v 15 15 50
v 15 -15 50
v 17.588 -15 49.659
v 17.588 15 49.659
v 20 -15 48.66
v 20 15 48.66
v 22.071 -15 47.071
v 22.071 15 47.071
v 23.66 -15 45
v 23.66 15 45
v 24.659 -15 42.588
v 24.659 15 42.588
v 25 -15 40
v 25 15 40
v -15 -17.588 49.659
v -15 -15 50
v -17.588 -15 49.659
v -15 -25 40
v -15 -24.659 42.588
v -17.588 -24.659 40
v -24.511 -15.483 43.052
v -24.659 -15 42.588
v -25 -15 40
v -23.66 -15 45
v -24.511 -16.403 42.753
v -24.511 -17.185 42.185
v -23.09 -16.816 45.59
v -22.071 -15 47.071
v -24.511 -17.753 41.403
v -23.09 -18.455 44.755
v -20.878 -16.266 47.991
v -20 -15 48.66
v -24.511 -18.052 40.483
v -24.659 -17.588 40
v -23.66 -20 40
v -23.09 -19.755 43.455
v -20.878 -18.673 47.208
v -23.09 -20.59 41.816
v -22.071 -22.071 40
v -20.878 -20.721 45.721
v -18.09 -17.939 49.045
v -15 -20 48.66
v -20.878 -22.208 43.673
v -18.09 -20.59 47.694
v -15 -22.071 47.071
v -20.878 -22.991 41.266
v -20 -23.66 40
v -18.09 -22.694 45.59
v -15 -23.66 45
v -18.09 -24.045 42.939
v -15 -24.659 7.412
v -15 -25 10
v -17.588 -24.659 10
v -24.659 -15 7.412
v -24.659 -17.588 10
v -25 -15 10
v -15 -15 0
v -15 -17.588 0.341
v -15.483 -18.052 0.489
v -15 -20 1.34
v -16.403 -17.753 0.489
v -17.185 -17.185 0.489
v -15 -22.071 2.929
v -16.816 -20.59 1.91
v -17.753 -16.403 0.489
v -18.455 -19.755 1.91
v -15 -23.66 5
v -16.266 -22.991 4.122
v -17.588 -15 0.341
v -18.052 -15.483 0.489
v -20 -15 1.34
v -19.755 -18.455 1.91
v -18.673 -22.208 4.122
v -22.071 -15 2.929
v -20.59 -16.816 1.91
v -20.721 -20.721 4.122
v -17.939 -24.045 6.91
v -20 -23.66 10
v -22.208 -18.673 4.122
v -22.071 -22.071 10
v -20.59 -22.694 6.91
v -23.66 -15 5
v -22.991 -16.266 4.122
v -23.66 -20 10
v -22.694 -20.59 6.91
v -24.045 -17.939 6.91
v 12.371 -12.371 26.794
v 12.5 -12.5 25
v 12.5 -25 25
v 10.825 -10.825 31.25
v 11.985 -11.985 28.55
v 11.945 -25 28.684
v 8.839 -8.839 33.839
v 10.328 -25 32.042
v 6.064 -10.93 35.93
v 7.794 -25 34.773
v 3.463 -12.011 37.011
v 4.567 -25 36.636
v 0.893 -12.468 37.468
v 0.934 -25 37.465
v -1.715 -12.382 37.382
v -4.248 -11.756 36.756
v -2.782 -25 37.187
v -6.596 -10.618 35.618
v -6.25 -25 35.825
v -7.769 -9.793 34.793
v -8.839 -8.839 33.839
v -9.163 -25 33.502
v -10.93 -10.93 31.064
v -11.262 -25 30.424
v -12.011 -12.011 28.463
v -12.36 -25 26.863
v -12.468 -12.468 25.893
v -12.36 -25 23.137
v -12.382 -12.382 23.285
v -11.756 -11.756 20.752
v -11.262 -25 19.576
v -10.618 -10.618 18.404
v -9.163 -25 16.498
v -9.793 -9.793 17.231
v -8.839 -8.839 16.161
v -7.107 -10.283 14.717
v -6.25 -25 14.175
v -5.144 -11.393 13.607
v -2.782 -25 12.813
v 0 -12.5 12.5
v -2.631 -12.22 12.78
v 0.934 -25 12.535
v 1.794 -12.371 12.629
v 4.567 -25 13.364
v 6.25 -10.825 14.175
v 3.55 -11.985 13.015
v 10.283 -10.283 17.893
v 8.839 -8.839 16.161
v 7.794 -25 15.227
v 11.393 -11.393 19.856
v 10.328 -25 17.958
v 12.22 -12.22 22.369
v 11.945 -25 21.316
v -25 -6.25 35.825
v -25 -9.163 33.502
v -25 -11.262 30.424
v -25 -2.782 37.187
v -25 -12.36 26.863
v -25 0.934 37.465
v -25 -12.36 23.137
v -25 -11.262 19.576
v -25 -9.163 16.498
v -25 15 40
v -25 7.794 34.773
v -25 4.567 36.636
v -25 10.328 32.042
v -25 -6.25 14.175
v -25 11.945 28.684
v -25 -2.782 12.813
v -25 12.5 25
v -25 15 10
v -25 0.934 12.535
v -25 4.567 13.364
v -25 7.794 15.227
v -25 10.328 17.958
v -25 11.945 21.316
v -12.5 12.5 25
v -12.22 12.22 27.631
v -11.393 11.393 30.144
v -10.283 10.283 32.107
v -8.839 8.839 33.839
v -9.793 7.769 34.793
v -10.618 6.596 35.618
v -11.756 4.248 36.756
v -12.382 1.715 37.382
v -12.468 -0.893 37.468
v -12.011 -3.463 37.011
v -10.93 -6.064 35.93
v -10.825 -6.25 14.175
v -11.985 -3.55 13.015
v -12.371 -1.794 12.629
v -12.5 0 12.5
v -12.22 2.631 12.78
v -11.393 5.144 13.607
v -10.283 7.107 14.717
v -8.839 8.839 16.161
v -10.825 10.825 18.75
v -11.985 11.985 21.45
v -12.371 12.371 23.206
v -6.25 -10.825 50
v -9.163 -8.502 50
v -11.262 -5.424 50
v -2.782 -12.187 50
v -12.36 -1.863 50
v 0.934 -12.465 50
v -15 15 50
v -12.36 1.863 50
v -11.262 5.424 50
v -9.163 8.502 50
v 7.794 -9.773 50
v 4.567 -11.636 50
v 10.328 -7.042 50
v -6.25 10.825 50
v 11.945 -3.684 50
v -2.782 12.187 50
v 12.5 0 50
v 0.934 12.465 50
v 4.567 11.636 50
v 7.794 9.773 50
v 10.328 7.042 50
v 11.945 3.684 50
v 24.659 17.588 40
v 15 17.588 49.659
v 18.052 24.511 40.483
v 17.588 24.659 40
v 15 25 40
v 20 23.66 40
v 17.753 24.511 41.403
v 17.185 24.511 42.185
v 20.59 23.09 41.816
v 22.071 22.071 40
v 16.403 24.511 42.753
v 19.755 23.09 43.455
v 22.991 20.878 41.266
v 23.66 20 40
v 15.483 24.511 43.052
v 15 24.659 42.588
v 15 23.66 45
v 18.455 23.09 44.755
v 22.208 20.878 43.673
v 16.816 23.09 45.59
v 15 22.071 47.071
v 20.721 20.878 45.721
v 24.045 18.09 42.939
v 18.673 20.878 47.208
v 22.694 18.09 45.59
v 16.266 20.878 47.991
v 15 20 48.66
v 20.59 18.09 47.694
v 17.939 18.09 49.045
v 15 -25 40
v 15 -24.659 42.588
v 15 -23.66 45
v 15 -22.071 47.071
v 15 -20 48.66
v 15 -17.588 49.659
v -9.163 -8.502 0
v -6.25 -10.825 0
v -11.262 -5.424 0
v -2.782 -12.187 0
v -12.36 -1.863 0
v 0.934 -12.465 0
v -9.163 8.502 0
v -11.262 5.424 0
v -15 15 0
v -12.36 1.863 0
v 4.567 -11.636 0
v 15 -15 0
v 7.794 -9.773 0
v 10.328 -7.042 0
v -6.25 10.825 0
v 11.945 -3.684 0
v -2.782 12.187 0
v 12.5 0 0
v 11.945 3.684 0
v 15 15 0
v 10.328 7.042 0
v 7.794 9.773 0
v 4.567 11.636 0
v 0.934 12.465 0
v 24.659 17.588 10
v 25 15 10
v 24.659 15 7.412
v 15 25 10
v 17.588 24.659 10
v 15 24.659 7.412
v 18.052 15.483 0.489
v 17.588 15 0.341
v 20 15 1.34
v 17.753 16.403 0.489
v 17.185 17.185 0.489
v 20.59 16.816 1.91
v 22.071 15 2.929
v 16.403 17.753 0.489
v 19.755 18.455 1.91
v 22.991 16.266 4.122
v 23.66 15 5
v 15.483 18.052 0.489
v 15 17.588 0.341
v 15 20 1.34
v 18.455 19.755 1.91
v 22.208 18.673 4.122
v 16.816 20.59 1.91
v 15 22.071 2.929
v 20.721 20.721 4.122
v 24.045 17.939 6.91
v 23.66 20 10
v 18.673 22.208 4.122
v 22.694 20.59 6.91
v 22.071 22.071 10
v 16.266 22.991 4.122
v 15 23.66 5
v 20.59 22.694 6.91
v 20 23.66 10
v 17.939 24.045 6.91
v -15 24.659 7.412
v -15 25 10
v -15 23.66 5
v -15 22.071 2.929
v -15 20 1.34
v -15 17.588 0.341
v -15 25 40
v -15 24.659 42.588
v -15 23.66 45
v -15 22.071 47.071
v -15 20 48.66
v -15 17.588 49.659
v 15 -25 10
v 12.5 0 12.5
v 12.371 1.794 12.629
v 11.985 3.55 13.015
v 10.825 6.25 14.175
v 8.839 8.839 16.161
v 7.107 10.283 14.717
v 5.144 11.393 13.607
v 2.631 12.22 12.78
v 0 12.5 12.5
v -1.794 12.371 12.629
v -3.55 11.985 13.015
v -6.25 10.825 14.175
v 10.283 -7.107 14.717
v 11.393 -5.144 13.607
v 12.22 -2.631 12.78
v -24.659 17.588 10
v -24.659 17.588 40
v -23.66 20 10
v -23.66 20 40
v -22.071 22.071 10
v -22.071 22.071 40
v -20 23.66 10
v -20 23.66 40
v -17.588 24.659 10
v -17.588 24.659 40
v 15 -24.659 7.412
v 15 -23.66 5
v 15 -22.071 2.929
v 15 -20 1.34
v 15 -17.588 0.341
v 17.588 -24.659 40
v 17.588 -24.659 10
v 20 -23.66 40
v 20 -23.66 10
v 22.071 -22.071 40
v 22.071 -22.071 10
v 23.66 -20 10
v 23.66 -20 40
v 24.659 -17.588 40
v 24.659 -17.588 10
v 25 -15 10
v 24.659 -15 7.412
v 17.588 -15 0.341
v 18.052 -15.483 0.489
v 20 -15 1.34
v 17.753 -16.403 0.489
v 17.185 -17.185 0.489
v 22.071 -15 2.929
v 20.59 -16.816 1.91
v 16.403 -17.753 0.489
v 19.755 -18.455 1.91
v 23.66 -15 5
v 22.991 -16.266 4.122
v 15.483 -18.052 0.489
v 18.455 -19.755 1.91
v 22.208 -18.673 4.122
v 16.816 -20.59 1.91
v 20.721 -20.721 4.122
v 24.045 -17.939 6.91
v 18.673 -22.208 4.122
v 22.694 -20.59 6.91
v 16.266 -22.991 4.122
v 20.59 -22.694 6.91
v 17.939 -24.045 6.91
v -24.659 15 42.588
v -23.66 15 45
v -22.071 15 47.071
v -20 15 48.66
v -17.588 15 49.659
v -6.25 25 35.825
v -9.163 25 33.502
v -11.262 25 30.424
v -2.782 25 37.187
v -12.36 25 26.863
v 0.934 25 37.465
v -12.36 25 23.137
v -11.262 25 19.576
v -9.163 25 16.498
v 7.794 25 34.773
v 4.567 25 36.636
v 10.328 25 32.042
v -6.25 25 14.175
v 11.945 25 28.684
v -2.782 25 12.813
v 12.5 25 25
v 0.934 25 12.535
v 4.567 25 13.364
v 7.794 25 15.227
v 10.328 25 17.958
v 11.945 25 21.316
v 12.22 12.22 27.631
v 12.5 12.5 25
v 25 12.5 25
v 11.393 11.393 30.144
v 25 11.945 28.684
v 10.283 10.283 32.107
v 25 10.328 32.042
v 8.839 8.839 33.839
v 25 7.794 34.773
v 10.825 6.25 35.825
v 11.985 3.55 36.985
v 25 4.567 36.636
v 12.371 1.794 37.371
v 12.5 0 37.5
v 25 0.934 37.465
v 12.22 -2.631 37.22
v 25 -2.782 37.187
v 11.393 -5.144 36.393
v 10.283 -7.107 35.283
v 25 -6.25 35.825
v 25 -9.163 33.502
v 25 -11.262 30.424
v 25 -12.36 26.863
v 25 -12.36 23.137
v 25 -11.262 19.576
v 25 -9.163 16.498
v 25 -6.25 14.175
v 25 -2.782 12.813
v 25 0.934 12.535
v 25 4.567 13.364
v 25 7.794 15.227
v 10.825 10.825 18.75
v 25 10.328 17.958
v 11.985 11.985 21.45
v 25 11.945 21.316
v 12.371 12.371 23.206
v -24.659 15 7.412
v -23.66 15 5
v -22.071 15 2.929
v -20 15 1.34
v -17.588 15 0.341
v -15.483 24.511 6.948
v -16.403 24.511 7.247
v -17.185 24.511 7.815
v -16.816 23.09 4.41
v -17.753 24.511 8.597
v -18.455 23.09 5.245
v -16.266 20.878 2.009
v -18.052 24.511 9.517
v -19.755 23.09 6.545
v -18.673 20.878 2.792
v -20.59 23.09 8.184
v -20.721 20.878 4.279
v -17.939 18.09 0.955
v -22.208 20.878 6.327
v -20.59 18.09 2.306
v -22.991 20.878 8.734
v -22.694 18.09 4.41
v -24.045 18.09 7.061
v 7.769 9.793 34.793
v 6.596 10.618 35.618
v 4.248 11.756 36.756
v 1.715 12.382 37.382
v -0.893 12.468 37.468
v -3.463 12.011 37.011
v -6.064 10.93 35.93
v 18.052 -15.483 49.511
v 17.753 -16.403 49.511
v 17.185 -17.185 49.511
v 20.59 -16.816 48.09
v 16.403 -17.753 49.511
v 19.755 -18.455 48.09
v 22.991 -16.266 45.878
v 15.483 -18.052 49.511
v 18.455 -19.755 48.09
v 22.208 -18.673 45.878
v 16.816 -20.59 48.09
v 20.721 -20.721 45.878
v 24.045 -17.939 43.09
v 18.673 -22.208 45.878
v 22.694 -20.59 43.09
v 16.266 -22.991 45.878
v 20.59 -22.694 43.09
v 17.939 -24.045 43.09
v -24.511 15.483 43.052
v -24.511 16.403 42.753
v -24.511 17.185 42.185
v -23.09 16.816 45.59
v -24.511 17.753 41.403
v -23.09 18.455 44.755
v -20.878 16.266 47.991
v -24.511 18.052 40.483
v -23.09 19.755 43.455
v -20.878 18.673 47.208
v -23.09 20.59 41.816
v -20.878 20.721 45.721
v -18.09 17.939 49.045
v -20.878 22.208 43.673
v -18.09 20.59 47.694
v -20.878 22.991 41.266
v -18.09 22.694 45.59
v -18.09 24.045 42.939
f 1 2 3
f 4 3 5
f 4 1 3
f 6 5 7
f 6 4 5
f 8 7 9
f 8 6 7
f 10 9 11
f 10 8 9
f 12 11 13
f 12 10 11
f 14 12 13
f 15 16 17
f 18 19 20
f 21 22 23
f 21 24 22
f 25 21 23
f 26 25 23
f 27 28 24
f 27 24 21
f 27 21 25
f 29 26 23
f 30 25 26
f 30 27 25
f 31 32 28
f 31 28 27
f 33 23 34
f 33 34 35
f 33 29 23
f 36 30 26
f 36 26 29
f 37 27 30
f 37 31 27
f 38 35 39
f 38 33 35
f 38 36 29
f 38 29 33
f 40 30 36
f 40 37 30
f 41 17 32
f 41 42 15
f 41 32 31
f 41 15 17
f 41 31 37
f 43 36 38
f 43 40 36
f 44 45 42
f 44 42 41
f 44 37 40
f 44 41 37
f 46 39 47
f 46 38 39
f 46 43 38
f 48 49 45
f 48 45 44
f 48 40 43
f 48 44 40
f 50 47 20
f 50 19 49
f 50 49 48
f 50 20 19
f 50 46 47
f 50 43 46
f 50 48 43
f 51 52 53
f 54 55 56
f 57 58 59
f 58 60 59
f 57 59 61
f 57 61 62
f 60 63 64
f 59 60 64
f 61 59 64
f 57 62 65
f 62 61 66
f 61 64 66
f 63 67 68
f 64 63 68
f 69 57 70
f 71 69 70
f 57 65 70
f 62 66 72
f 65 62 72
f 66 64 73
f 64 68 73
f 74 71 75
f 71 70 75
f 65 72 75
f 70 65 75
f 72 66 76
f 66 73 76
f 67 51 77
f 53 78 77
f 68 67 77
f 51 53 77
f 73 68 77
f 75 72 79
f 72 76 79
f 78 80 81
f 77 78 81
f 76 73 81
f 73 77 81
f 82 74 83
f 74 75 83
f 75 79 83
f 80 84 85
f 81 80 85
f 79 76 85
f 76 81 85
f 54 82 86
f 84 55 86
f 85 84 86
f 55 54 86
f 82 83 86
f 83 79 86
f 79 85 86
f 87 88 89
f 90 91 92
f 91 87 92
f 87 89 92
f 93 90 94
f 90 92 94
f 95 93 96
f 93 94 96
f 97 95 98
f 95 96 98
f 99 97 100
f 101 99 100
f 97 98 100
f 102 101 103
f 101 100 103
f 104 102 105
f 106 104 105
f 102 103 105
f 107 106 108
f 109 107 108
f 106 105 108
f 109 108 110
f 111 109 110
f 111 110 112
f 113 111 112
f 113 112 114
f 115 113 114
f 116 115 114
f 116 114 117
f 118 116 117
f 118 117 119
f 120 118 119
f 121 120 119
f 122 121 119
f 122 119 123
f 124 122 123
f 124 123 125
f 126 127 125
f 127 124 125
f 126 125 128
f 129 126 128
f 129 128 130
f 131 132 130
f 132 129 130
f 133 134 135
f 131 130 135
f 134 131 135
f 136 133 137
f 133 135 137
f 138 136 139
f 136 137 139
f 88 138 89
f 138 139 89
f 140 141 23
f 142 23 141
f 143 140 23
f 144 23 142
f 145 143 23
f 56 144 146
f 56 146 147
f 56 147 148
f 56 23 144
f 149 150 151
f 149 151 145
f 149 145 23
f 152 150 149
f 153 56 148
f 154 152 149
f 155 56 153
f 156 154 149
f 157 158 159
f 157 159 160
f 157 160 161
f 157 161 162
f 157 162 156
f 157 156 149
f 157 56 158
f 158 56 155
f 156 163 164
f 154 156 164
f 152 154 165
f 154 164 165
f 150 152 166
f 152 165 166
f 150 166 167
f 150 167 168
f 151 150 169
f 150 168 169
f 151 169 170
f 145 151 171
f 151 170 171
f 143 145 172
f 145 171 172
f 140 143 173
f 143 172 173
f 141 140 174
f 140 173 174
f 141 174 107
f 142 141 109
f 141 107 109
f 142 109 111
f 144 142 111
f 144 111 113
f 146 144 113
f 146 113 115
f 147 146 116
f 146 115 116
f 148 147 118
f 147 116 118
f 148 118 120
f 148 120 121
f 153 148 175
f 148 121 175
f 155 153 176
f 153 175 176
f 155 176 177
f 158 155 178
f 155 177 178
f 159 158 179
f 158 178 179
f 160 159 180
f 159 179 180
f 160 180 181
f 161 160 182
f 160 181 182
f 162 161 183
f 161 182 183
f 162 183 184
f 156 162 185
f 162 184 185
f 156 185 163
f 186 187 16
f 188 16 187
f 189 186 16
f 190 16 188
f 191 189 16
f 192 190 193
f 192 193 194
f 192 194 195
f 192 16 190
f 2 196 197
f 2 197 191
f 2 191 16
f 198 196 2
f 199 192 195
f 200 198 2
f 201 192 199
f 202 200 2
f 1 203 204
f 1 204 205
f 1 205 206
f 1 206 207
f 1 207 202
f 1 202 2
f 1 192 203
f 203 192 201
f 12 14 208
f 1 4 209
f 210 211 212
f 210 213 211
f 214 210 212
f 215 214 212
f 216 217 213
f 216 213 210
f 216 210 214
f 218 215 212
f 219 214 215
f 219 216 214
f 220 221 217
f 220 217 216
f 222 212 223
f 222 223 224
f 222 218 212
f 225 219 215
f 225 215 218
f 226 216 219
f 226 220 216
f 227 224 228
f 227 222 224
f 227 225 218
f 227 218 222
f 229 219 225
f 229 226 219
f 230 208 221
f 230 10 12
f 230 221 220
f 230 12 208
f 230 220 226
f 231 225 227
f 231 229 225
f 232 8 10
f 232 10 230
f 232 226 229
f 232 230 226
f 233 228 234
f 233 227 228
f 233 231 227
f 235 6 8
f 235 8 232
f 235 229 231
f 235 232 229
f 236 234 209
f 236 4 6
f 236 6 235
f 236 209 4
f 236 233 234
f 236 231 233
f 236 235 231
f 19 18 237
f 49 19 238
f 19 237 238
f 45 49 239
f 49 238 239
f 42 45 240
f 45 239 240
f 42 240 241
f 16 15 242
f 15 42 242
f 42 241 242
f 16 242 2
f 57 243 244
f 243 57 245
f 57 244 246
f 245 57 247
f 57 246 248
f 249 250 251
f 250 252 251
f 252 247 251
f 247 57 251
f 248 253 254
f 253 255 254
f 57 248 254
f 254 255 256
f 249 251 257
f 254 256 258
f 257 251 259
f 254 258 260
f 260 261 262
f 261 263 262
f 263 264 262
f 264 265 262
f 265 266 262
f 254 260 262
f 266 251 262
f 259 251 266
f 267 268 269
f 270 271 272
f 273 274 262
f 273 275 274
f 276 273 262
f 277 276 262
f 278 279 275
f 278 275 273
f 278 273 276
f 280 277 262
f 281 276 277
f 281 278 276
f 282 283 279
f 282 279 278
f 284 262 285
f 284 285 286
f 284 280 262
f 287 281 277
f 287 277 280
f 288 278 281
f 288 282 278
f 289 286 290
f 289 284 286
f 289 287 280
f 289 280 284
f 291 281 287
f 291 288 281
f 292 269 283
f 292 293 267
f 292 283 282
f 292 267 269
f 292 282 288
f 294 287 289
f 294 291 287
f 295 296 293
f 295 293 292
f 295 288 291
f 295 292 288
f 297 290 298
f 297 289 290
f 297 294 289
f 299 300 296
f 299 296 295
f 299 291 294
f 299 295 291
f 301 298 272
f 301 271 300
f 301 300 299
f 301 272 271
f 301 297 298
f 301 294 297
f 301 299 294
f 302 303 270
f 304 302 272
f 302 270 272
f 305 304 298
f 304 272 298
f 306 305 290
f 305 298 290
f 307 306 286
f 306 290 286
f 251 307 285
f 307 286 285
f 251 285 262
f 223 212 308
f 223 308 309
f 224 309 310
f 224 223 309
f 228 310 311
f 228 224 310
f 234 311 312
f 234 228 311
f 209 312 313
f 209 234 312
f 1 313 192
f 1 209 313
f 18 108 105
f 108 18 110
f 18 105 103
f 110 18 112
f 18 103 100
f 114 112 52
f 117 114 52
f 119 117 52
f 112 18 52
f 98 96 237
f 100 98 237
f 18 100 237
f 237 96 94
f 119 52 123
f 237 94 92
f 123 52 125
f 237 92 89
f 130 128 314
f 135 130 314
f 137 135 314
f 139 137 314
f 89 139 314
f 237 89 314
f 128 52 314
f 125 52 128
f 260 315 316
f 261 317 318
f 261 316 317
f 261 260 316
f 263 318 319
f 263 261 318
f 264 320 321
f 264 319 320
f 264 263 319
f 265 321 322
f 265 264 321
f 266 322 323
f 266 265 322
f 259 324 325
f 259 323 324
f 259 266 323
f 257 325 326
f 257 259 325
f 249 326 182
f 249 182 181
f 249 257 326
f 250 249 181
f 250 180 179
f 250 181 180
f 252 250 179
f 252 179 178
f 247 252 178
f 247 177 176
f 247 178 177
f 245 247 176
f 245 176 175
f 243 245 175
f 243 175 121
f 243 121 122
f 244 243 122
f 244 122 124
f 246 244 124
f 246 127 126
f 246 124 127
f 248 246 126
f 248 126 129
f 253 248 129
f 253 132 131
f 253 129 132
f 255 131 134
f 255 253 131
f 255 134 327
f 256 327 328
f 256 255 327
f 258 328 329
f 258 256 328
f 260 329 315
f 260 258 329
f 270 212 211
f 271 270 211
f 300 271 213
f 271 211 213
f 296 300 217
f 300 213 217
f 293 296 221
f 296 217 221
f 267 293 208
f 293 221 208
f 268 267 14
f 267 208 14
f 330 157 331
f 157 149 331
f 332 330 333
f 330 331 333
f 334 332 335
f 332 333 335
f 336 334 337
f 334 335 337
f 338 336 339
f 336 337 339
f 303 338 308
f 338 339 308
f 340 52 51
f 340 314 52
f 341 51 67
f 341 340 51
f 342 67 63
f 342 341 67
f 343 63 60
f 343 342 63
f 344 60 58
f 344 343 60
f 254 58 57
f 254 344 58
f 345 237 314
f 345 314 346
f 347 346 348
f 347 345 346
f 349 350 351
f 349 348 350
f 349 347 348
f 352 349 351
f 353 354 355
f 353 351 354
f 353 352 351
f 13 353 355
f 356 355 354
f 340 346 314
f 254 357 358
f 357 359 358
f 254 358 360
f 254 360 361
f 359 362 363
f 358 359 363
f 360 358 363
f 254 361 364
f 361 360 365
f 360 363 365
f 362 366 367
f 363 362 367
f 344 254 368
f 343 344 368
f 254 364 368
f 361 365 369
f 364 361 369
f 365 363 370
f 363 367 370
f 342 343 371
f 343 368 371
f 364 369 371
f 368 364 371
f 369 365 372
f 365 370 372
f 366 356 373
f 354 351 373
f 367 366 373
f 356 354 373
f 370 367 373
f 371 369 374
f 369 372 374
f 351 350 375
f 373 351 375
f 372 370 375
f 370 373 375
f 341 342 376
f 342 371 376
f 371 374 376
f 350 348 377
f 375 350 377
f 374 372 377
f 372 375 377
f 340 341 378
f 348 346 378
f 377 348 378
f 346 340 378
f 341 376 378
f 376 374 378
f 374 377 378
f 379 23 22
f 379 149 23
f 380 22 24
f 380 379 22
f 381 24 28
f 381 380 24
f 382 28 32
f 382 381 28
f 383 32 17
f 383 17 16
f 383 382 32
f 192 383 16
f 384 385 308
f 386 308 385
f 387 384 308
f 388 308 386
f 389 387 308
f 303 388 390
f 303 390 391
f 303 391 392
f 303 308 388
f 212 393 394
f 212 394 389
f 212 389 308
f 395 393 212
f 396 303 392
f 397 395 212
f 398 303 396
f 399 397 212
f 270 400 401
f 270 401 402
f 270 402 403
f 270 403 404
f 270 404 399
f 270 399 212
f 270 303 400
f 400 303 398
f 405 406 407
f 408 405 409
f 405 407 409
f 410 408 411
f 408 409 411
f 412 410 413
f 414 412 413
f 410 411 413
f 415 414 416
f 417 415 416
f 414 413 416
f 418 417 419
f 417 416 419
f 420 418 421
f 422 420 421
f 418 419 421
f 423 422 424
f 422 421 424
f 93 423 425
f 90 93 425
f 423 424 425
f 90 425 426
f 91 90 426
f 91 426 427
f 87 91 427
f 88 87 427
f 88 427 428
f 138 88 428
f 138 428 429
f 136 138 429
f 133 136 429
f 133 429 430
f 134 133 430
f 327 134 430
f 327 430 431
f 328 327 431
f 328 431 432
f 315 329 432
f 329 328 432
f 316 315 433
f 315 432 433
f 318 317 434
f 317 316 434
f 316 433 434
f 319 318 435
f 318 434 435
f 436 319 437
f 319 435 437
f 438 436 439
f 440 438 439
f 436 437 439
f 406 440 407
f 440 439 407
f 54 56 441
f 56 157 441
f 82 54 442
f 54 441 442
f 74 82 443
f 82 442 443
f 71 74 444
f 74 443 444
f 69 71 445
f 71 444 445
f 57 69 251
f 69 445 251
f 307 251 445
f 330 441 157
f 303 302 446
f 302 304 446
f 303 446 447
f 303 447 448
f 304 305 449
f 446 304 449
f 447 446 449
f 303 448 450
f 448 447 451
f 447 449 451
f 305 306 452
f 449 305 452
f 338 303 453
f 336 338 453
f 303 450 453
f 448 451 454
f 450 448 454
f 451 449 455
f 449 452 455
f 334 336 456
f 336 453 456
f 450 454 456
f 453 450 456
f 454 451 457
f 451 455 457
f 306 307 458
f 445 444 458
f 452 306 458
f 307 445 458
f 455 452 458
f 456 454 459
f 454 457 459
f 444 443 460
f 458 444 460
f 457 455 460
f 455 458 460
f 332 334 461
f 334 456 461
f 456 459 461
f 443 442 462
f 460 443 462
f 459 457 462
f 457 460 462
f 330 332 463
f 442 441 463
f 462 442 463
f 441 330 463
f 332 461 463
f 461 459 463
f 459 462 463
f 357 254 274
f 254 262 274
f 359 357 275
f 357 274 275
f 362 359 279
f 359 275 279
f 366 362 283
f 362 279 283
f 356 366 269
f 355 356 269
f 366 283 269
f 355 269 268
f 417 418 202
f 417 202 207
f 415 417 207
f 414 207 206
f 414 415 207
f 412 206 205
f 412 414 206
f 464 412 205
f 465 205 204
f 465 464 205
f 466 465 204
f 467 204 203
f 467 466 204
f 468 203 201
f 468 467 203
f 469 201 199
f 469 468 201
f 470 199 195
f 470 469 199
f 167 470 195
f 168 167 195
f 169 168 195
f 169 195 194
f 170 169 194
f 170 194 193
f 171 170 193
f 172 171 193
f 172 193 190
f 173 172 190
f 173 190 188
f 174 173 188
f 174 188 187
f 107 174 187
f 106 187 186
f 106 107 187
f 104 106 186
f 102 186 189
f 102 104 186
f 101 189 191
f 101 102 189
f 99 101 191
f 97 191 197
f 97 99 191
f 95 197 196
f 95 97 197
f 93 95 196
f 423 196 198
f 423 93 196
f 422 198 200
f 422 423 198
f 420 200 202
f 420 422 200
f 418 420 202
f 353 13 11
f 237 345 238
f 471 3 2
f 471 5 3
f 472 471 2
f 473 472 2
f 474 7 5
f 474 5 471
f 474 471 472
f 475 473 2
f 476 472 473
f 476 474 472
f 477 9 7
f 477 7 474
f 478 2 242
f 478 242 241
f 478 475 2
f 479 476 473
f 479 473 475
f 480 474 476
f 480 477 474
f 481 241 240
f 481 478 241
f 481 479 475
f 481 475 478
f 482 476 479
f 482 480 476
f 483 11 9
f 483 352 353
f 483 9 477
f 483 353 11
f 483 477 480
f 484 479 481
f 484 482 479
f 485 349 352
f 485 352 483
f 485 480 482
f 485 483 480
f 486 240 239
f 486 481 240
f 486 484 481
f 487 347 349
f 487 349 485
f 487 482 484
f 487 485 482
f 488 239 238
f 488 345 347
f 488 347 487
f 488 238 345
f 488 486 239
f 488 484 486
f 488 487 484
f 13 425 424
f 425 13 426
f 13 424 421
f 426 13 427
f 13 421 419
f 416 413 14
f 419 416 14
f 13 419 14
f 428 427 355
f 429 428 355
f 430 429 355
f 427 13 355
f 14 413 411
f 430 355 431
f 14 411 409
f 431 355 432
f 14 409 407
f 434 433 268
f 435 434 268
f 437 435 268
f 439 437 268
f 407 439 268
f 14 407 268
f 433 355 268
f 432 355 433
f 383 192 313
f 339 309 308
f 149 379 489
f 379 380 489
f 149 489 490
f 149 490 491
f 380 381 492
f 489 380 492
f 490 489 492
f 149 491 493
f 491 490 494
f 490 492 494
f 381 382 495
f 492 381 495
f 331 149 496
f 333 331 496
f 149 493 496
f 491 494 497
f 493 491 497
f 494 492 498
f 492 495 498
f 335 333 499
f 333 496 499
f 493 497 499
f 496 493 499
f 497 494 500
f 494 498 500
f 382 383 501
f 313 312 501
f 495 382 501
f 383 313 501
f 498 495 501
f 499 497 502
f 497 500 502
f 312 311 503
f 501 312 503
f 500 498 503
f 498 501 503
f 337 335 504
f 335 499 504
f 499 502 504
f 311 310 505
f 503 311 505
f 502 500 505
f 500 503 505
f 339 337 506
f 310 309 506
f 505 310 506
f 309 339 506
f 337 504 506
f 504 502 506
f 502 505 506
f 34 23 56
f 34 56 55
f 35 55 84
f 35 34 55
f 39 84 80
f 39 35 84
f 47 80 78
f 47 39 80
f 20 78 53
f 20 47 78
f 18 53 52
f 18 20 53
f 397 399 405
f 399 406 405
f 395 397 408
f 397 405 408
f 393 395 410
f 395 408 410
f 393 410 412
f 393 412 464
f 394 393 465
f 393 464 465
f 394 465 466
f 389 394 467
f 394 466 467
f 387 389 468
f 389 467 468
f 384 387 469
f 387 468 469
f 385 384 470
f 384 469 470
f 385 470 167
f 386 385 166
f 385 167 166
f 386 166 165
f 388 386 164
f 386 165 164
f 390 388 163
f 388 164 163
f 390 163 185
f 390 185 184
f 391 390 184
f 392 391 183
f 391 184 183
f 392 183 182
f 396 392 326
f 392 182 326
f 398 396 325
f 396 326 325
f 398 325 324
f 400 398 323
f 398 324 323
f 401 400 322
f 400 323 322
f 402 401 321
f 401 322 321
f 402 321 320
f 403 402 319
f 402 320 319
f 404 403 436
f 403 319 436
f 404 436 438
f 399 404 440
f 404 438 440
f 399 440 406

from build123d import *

# Parameters (mm, degrees)
F0_W     = 50
F0_H     = 50
F1_DEPTH = 50
F2_R     = 12.5
F3_DEPTH = 213.370338
F4_R     = 10
F5_R     = 12.5
F6_DEPTH = 50
F7_R     = 12.5
F8_DEPTH = 50


with BuildPart() as f1:
    # F0 (on Top) → F1 (new body)
    with BuildSketch(Plane.XY):
        Rectangle(F0_W, F0_H)
    extrude(amount=F1_DEPTH)

    # F2 (on Top) → F3 (cut)
    with BuildSketch(Plane.XY):
        Circle(F2_R)
    extrude(amount=F3_DEPTH, mode=Mode.SUBTRACT)

    # F4
    f4_edges = [f1.edges().sort_by_distance(p)[0] for p in [
        (25, -25, 25),
        (25, 0, 50),
        (25, 25, 25),
        (25, 0, 0),
        (0, 25, 50),
        (0, -25, 50),
        (-25, 0, 50),
        (-25, -25, 25),
        (0, -25, 0),
        (-25, 0, 0),
        (0, 25, 0),
        (-25, 25, 25),
    ]]
    fillet(f4_edges, radius=F4_R)

    # F5 (on Right) → F6 (cut, symmetric)
    with BuildSketch(Plane.YZ):
        with Locations((0, 25)):
            Circle(F5_R)
    extrude(amount=F6_DEPTH, both=True, mode=Mode.SUBTRACT)

    # F7 (on Front) → F8 (cut, symmetric)
    with BuildSketch(Plane.XZ):
        with Locations((0, 25)):
            Circle(F7_R)
    extrude(amount=F8_DEPTH, both=True, mode=Mode.SUBTRACT)


solid = f1.part
